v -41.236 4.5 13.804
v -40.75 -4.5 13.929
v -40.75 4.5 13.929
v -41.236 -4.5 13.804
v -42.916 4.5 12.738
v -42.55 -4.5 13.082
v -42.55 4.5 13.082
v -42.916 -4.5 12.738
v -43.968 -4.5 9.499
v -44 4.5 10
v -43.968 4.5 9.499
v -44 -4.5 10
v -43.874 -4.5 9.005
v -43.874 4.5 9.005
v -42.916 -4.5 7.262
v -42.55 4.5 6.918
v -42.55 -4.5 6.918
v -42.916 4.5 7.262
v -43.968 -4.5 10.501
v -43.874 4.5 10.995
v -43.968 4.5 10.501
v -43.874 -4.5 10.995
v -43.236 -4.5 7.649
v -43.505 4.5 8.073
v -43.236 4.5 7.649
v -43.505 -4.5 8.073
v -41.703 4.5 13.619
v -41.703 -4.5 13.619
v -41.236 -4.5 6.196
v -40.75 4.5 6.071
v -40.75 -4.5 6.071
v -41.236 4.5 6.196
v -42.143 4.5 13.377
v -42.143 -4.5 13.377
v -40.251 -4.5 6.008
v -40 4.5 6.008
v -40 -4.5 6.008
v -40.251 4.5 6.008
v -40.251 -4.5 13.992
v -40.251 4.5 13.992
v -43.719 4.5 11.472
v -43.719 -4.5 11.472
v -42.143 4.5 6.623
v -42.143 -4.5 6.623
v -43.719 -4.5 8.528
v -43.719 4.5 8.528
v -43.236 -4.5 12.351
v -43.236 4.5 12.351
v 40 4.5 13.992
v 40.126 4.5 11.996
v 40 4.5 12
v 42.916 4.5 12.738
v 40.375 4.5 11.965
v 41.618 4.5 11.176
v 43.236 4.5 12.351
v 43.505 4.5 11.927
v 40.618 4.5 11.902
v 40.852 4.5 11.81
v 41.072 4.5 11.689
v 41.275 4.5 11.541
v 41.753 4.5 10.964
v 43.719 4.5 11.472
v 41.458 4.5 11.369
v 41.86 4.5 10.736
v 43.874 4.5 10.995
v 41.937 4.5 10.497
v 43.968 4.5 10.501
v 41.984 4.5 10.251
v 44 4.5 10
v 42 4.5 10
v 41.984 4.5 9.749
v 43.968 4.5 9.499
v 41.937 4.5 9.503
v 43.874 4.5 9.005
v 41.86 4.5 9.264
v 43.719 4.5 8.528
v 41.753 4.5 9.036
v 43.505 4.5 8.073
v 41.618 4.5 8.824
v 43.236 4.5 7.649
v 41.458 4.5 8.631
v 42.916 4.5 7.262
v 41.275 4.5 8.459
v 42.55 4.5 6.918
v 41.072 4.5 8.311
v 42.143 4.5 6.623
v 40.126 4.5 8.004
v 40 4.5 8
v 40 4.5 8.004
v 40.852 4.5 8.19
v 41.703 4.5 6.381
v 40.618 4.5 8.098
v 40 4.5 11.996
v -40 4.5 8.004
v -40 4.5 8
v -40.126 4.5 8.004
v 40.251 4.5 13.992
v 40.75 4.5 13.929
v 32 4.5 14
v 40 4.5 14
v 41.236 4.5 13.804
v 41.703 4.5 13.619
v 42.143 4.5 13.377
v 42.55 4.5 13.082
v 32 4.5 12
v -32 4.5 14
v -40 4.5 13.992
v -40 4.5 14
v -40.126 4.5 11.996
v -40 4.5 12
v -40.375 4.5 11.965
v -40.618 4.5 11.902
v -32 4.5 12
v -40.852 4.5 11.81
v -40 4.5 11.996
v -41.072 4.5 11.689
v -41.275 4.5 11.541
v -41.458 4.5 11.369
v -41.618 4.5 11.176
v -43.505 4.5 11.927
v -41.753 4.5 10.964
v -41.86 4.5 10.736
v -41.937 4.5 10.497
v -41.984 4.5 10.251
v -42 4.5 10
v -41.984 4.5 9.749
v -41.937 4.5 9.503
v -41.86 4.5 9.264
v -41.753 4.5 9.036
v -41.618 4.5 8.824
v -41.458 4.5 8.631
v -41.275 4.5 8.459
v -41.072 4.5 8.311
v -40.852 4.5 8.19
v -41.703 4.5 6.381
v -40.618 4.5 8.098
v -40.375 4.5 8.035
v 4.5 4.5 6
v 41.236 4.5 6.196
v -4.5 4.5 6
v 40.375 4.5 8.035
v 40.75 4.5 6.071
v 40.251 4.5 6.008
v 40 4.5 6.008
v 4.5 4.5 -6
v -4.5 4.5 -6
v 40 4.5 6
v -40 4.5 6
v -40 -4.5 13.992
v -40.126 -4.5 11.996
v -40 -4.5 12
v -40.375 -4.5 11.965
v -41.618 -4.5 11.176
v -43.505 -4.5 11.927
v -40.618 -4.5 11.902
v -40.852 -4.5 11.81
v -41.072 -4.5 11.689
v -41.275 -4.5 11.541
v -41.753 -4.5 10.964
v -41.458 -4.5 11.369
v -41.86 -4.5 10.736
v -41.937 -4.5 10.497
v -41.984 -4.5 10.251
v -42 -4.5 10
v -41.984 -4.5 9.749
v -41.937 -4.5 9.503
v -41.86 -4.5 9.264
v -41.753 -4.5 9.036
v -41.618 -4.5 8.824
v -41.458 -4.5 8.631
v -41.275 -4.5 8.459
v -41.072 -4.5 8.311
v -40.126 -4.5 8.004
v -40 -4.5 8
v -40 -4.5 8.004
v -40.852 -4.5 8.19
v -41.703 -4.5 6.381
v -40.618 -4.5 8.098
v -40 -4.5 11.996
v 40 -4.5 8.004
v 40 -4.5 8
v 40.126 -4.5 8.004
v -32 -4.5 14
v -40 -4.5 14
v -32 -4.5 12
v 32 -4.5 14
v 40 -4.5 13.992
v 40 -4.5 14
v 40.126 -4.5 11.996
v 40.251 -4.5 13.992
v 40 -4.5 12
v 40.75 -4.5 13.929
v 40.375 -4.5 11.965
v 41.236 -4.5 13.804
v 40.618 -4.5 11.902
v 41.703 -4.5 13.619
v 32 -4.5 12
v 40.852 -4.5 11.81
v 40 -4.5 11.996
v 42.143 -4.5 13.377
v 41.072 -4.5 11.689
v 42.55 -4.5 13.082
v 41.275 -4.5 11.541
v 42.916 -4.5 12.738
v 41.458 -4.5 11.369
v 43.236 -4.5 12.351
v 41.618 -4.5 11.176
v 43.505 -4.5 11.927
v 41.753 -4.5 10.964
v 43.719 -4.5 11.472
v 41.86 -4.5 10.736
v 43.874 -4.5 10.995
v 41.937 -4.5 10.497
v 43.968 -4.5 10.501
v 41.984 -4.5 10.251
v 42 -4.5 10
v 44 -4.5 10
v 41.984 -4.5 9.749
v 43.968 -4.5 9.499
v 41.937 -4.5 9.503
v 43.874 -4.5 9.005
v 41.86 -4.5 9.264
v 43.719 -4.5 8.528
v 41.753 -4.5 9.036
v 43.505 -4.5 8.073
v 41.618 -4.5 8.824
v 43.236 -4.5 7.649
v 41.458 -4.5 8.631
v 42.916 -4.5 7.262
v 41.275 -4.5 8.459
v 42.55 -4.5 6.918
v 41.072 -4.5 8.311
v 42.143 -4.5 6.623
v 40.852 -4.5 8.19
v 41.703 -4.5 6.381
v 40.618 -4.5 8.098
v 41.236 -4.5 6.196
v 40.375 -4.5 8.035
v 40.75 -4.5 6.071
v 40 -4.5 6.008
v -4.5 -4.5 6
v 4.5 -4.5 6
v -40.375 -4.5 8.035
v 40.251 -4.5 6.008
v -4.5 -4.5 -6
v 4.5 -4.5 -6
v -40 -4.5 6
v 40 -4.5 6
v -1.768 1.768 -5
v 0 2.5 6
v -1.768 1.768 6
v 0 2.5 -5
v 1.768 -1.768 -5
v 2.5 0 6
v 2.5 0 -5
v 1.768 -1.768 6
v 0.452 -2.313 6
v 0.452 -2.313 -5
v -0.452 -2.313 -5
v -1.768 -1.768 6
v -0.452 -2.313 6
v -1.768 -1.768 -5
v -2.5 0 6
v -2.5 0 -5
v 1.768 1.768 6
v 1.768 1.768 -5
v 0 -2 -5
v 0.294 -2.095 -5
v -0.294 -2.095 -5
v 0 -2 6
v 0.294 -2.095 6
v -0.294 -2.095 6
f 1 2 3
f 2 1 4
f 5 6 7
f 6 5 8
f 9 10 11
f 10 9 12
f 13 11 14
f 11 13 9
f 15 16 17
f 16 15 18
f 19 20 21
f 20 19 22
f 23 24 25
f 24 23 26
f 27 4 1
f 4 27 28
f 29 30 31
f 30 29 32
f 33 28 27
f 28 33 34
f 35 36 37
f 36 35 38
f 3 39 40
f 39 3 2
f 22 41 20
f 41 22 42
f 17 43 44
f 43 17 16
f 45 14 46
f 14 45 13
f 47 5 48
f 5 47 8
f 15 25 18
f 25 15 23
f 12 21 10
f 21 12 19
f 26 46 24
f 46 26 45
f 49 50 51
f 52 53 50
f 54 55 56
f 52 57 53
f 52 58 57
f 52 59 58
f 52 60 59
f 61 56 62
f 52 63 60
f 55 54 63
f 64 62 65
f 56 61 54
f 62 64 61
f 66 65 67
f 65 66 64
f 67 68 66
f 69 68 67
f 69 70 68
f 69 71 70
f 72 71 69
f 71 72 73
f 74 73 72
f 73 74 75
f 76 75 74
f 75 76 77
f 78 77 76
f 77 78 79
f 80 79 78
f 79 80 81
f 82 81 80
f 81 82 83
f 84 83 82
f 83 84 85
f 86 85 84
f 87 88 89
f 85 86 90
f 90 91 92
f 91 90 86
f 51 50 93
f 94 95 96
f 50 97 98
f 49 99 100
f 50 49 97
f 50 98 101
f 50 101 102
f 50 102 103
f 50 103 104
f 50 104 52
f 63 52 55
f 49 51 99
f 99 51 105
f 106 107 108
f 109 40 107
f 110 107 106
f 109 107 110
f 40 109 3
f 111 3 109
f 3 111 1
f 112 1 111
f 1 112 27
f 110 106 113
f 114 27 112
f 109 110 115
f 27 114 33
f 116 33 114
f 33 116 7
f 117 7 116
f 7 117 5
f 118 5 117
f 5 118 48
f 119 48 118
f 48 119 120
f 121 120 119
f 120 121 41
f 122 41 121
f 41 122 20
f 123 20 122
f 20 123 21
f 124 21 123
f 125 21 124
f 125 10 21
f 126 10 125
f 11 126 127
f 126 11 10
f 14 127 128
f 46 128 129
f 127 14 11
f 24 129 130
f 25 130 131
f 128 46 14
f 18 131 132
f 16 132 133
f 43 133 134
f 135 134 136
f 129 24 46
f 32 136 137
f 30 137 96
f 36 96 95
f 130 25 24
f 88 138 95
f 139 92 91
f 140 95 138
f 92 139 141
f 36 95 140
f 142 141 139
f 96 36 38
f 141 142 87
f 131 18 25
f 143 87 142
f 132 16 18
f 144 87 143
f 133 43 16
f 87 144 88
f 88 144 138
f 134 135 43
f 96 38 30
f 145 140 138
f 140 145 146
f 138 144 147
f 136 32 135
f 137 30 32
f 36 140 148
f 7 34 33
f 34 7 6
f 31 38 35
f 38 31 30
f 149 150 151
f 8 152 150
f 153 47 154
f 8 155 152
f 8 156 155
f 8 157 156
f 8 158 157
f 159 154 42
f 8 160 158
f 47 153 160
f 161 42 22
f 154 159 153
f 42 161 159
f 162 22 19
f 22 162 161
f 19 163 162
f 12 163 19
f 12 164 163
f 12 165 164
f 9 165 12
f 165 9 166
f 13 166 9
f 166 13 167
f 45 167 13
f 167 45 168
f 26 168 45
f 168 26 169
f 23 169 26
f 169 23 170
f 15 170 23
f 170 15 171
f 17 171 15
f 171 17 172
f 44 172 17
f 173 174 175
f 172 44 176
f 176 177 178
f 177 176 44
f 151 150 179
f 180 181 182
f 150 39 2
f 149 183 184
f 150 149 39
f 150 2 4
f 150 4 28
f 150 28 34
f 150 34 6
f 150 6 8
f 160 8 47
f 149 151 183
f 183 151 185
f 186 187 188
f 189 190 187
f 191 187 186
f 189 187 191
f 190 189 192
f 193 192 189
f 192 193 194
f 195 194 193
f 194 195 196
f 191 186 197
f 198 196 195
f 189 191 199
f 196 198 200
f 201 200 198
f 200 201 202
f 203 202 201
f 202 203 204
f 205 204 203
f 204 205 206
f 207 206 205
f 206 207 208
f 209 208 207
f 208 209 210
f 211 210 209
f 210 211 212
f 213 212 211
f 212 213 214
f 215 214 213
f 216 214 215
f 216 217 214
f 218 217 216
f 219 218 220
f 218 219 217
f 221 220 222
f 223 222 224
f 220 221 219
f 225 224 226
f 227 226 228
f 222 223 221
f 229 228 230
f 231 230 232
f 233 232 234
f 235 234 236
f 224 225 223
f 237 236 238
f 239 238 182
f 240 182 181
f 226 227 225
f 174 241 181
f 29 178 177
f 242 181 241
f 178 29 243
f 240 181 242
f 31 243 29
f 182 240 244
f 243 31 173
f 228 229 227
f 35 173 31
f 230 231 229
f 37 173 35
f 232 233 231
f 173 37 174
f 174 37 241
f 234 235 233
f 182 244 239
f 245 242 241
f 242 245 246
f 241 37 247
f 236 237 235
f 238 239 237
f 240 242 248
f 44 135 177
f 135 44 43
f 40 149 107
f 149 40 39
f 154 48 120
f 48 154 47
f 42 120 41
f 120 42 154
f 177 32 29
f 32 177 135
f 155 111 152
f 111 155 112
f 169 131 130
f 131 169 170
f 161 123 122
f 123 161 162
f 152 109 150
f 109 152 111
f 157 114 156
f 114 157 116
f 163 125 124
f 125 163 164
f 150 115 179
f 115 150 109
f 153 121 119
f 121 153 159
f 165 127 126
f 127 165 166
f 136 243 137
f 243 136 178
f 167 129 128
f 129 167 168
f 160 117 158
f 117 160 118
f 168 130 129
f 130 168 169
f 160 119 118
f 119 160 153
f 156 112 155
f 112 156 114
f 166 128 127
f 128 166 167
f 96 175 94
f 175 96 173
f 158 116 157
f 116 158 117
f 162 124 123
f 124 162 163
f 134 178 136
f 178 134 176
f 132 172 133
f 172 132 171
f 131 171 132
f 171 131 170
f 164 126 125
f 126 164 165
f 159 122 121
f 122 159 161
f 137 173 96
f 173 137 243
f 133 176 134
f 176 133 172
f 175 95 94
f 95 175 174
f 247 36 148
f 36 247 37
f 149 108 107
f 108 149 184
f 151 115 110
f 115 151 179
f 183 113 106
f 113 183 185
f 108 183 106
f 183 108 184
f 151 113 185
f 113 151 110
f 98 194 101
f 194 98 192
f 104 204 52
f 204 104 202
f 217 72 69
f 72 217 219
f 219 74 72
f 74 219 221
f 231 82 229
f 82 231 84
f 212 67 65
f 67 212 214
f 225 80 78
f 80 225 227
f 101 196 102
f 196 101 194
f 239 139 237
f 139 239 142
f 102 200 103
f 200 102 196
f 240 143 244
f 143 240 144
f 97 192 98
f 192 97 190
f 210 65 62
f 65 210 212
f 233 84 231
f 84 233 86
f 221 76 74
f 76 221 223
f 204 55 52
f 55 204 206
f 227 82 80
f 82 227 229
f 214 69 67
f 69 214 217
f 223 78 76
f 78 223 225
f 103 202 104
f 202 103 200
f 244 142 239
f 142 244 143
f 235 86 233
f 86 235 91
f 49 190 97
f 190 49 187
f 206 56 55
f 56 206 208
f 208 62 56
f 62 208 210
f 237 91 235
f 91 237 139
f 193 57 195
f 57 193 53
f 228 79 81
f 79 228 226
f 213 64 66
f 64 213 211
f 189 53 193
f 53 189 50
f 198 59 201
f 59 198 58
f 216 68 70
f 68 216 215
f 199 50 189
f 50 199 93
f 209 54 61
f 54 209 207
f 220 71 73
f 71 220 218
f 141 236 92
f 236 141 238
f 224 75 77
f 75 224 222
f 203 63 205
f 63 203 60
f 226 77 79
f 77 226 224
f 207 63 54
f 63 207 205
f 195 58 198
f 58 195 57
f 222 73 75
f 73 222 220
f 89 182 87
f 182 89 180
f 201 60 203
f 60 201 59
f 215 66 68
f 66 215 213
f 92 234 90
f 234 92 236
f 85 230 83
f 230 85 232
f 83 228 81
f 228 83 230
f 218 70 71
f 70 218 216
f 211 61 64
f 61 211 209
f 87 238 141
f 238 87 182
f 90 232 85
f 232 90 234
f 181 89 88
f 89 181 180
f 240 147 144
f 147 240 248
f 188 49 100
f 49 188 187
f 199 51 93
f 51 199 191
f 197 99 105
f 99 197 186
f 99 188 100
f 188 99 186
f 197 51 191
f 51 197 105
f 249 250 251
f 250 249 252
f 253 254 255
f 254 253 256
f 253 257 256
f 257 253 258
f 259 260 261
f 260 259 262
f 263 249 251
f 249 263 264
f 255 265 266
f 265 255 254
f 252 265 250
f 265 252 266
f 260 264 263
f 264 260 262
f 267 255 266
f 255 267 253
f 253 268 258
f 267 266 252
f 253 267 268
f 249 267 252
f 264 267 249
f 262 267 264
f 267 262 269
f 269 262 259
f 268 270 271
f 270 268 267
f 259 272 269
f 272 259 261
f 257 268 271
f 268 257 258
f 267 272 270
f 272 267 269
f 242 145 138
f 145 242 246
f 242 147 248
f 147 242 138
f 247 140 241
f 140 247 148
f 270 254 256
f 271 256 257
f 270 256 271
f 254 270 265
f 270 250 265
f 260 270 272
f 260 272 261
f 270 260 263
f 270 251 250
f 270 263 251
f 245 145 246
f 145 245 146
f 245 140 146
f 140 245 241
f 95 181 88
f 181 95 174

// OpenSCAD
// file: cylinder_with_notch.scad
//
// Makes a cylinder with a notch.
// Params:
//   radio -- Radio of the cylinder.
//   height -- Height of the cylinder.
//   notch_radio -- Radio of the notch.
//   center -- [true, false] Center the cylinder in origin [0,0,0].
//
module cylinder_with_notch(
    radio = 10, height = 30, notch_radio = 2, center=false, $fn=$fn)
{
  
  difference() 
  {
    // Main cylinder.
    cylinder(r=radio, h=height, center=center);
    // Lets subtract notch.
    translate([radio, 0, 0])
      cylinder(r=notch_radio, h=height+10, center=center, $fn=$fn+10);
  }
} 

// Cylinder with notch.
cylinder_with_notch(radio=10, height=30, notch_radio=2, center=true);
// main file
use <cylinder_with_notch.scad>

module copy_mirror(vec=[0,1,0]) {
  children();
  mirror(vec) children();
}

module support(length=80, link_radio=2.5, link_slot_height=10, thickness=2, 
               gap=2, flange_length=8, notch_radio=0.5) 
{

  socket_width = link_radio + thickness;
  socket_height = link_slot_height + thickness;  
  flange_radio = thickness + gap;

  copy_mirror([1,0,0]) 
  {
    // Top part or the support's border flanges.
    translate([-length/2+flange_length/2, 
              0, 
              socket_height/2-thickness/2+2*flange_radio])
      cube([flange_length, 2*socket_width, thickness], center=true);
    // Half cylinder to make support's border flanges
    translate([-length/2, 0, socket_height/2+flange_radio])
      rotate([90, 0, 0])
        difference() {
          cylinder(r=flange_radio, h=2*socket_width, $fn=50, center=true);
          cylinder(r=gap, h=2*socket_width+10, $fn=50, center=true);
          translate([(flange_radio+10)/2, 0, 0])
            cube([flange_radio+10, flange_radio+10, 2*socket_width+10], 
                 center=true);
        }
  }
  // Base of the support.
  translate([0, 0, thickness/2+socket_height/2])
    cube([length, 2*socket_width, thickness], center=true);
  // Hollow cylinder to receive link.
  difference() 
  {
    cube([2*socket_width, 2*socket_width, socket_height], center=true);
//    cylinder(r=socket_width, h=socket_height, $fn=50, center=true);
    translate([0, 0, -(link_slot_height+10)/2 + link_slot_height/2])
      rotate([0, 0, -90])
        cylinder_with_notch(radio=link_radio, height=link_slot_height+10,
                            notch_radio=notch_radio);
  }
}

// Support's length.
LENGTH = 80;

// Support's thickness
THICKNESS = 2;

// Support's paper gap.
GAP = 2;

// Support's roundness
ROUNDNESS = 0;

// Support's flange length.
FLANGE_LENGTH = 8;

// Support's socket link radio.
LINK_RADIO = 2.5;

// Support's socket link slot height.
LINK_SLOT_HEIGHT = 10;

// Support's socket link notch radio.
NOTCH_RADIO = 0.5;

// Show debug info on output console and draw auxiliary geometry to check.
DEBUG=true;

support(length=LENGTH, link_radio=LINK_RADIO, 
        link_slot_height=LINK_SLOT_HEIGHT, thickness=THICKNESS, gap=GAP, 
        flange_length=FLANGE_LENGTH, notch_radio=NOTCH_RADIO);
